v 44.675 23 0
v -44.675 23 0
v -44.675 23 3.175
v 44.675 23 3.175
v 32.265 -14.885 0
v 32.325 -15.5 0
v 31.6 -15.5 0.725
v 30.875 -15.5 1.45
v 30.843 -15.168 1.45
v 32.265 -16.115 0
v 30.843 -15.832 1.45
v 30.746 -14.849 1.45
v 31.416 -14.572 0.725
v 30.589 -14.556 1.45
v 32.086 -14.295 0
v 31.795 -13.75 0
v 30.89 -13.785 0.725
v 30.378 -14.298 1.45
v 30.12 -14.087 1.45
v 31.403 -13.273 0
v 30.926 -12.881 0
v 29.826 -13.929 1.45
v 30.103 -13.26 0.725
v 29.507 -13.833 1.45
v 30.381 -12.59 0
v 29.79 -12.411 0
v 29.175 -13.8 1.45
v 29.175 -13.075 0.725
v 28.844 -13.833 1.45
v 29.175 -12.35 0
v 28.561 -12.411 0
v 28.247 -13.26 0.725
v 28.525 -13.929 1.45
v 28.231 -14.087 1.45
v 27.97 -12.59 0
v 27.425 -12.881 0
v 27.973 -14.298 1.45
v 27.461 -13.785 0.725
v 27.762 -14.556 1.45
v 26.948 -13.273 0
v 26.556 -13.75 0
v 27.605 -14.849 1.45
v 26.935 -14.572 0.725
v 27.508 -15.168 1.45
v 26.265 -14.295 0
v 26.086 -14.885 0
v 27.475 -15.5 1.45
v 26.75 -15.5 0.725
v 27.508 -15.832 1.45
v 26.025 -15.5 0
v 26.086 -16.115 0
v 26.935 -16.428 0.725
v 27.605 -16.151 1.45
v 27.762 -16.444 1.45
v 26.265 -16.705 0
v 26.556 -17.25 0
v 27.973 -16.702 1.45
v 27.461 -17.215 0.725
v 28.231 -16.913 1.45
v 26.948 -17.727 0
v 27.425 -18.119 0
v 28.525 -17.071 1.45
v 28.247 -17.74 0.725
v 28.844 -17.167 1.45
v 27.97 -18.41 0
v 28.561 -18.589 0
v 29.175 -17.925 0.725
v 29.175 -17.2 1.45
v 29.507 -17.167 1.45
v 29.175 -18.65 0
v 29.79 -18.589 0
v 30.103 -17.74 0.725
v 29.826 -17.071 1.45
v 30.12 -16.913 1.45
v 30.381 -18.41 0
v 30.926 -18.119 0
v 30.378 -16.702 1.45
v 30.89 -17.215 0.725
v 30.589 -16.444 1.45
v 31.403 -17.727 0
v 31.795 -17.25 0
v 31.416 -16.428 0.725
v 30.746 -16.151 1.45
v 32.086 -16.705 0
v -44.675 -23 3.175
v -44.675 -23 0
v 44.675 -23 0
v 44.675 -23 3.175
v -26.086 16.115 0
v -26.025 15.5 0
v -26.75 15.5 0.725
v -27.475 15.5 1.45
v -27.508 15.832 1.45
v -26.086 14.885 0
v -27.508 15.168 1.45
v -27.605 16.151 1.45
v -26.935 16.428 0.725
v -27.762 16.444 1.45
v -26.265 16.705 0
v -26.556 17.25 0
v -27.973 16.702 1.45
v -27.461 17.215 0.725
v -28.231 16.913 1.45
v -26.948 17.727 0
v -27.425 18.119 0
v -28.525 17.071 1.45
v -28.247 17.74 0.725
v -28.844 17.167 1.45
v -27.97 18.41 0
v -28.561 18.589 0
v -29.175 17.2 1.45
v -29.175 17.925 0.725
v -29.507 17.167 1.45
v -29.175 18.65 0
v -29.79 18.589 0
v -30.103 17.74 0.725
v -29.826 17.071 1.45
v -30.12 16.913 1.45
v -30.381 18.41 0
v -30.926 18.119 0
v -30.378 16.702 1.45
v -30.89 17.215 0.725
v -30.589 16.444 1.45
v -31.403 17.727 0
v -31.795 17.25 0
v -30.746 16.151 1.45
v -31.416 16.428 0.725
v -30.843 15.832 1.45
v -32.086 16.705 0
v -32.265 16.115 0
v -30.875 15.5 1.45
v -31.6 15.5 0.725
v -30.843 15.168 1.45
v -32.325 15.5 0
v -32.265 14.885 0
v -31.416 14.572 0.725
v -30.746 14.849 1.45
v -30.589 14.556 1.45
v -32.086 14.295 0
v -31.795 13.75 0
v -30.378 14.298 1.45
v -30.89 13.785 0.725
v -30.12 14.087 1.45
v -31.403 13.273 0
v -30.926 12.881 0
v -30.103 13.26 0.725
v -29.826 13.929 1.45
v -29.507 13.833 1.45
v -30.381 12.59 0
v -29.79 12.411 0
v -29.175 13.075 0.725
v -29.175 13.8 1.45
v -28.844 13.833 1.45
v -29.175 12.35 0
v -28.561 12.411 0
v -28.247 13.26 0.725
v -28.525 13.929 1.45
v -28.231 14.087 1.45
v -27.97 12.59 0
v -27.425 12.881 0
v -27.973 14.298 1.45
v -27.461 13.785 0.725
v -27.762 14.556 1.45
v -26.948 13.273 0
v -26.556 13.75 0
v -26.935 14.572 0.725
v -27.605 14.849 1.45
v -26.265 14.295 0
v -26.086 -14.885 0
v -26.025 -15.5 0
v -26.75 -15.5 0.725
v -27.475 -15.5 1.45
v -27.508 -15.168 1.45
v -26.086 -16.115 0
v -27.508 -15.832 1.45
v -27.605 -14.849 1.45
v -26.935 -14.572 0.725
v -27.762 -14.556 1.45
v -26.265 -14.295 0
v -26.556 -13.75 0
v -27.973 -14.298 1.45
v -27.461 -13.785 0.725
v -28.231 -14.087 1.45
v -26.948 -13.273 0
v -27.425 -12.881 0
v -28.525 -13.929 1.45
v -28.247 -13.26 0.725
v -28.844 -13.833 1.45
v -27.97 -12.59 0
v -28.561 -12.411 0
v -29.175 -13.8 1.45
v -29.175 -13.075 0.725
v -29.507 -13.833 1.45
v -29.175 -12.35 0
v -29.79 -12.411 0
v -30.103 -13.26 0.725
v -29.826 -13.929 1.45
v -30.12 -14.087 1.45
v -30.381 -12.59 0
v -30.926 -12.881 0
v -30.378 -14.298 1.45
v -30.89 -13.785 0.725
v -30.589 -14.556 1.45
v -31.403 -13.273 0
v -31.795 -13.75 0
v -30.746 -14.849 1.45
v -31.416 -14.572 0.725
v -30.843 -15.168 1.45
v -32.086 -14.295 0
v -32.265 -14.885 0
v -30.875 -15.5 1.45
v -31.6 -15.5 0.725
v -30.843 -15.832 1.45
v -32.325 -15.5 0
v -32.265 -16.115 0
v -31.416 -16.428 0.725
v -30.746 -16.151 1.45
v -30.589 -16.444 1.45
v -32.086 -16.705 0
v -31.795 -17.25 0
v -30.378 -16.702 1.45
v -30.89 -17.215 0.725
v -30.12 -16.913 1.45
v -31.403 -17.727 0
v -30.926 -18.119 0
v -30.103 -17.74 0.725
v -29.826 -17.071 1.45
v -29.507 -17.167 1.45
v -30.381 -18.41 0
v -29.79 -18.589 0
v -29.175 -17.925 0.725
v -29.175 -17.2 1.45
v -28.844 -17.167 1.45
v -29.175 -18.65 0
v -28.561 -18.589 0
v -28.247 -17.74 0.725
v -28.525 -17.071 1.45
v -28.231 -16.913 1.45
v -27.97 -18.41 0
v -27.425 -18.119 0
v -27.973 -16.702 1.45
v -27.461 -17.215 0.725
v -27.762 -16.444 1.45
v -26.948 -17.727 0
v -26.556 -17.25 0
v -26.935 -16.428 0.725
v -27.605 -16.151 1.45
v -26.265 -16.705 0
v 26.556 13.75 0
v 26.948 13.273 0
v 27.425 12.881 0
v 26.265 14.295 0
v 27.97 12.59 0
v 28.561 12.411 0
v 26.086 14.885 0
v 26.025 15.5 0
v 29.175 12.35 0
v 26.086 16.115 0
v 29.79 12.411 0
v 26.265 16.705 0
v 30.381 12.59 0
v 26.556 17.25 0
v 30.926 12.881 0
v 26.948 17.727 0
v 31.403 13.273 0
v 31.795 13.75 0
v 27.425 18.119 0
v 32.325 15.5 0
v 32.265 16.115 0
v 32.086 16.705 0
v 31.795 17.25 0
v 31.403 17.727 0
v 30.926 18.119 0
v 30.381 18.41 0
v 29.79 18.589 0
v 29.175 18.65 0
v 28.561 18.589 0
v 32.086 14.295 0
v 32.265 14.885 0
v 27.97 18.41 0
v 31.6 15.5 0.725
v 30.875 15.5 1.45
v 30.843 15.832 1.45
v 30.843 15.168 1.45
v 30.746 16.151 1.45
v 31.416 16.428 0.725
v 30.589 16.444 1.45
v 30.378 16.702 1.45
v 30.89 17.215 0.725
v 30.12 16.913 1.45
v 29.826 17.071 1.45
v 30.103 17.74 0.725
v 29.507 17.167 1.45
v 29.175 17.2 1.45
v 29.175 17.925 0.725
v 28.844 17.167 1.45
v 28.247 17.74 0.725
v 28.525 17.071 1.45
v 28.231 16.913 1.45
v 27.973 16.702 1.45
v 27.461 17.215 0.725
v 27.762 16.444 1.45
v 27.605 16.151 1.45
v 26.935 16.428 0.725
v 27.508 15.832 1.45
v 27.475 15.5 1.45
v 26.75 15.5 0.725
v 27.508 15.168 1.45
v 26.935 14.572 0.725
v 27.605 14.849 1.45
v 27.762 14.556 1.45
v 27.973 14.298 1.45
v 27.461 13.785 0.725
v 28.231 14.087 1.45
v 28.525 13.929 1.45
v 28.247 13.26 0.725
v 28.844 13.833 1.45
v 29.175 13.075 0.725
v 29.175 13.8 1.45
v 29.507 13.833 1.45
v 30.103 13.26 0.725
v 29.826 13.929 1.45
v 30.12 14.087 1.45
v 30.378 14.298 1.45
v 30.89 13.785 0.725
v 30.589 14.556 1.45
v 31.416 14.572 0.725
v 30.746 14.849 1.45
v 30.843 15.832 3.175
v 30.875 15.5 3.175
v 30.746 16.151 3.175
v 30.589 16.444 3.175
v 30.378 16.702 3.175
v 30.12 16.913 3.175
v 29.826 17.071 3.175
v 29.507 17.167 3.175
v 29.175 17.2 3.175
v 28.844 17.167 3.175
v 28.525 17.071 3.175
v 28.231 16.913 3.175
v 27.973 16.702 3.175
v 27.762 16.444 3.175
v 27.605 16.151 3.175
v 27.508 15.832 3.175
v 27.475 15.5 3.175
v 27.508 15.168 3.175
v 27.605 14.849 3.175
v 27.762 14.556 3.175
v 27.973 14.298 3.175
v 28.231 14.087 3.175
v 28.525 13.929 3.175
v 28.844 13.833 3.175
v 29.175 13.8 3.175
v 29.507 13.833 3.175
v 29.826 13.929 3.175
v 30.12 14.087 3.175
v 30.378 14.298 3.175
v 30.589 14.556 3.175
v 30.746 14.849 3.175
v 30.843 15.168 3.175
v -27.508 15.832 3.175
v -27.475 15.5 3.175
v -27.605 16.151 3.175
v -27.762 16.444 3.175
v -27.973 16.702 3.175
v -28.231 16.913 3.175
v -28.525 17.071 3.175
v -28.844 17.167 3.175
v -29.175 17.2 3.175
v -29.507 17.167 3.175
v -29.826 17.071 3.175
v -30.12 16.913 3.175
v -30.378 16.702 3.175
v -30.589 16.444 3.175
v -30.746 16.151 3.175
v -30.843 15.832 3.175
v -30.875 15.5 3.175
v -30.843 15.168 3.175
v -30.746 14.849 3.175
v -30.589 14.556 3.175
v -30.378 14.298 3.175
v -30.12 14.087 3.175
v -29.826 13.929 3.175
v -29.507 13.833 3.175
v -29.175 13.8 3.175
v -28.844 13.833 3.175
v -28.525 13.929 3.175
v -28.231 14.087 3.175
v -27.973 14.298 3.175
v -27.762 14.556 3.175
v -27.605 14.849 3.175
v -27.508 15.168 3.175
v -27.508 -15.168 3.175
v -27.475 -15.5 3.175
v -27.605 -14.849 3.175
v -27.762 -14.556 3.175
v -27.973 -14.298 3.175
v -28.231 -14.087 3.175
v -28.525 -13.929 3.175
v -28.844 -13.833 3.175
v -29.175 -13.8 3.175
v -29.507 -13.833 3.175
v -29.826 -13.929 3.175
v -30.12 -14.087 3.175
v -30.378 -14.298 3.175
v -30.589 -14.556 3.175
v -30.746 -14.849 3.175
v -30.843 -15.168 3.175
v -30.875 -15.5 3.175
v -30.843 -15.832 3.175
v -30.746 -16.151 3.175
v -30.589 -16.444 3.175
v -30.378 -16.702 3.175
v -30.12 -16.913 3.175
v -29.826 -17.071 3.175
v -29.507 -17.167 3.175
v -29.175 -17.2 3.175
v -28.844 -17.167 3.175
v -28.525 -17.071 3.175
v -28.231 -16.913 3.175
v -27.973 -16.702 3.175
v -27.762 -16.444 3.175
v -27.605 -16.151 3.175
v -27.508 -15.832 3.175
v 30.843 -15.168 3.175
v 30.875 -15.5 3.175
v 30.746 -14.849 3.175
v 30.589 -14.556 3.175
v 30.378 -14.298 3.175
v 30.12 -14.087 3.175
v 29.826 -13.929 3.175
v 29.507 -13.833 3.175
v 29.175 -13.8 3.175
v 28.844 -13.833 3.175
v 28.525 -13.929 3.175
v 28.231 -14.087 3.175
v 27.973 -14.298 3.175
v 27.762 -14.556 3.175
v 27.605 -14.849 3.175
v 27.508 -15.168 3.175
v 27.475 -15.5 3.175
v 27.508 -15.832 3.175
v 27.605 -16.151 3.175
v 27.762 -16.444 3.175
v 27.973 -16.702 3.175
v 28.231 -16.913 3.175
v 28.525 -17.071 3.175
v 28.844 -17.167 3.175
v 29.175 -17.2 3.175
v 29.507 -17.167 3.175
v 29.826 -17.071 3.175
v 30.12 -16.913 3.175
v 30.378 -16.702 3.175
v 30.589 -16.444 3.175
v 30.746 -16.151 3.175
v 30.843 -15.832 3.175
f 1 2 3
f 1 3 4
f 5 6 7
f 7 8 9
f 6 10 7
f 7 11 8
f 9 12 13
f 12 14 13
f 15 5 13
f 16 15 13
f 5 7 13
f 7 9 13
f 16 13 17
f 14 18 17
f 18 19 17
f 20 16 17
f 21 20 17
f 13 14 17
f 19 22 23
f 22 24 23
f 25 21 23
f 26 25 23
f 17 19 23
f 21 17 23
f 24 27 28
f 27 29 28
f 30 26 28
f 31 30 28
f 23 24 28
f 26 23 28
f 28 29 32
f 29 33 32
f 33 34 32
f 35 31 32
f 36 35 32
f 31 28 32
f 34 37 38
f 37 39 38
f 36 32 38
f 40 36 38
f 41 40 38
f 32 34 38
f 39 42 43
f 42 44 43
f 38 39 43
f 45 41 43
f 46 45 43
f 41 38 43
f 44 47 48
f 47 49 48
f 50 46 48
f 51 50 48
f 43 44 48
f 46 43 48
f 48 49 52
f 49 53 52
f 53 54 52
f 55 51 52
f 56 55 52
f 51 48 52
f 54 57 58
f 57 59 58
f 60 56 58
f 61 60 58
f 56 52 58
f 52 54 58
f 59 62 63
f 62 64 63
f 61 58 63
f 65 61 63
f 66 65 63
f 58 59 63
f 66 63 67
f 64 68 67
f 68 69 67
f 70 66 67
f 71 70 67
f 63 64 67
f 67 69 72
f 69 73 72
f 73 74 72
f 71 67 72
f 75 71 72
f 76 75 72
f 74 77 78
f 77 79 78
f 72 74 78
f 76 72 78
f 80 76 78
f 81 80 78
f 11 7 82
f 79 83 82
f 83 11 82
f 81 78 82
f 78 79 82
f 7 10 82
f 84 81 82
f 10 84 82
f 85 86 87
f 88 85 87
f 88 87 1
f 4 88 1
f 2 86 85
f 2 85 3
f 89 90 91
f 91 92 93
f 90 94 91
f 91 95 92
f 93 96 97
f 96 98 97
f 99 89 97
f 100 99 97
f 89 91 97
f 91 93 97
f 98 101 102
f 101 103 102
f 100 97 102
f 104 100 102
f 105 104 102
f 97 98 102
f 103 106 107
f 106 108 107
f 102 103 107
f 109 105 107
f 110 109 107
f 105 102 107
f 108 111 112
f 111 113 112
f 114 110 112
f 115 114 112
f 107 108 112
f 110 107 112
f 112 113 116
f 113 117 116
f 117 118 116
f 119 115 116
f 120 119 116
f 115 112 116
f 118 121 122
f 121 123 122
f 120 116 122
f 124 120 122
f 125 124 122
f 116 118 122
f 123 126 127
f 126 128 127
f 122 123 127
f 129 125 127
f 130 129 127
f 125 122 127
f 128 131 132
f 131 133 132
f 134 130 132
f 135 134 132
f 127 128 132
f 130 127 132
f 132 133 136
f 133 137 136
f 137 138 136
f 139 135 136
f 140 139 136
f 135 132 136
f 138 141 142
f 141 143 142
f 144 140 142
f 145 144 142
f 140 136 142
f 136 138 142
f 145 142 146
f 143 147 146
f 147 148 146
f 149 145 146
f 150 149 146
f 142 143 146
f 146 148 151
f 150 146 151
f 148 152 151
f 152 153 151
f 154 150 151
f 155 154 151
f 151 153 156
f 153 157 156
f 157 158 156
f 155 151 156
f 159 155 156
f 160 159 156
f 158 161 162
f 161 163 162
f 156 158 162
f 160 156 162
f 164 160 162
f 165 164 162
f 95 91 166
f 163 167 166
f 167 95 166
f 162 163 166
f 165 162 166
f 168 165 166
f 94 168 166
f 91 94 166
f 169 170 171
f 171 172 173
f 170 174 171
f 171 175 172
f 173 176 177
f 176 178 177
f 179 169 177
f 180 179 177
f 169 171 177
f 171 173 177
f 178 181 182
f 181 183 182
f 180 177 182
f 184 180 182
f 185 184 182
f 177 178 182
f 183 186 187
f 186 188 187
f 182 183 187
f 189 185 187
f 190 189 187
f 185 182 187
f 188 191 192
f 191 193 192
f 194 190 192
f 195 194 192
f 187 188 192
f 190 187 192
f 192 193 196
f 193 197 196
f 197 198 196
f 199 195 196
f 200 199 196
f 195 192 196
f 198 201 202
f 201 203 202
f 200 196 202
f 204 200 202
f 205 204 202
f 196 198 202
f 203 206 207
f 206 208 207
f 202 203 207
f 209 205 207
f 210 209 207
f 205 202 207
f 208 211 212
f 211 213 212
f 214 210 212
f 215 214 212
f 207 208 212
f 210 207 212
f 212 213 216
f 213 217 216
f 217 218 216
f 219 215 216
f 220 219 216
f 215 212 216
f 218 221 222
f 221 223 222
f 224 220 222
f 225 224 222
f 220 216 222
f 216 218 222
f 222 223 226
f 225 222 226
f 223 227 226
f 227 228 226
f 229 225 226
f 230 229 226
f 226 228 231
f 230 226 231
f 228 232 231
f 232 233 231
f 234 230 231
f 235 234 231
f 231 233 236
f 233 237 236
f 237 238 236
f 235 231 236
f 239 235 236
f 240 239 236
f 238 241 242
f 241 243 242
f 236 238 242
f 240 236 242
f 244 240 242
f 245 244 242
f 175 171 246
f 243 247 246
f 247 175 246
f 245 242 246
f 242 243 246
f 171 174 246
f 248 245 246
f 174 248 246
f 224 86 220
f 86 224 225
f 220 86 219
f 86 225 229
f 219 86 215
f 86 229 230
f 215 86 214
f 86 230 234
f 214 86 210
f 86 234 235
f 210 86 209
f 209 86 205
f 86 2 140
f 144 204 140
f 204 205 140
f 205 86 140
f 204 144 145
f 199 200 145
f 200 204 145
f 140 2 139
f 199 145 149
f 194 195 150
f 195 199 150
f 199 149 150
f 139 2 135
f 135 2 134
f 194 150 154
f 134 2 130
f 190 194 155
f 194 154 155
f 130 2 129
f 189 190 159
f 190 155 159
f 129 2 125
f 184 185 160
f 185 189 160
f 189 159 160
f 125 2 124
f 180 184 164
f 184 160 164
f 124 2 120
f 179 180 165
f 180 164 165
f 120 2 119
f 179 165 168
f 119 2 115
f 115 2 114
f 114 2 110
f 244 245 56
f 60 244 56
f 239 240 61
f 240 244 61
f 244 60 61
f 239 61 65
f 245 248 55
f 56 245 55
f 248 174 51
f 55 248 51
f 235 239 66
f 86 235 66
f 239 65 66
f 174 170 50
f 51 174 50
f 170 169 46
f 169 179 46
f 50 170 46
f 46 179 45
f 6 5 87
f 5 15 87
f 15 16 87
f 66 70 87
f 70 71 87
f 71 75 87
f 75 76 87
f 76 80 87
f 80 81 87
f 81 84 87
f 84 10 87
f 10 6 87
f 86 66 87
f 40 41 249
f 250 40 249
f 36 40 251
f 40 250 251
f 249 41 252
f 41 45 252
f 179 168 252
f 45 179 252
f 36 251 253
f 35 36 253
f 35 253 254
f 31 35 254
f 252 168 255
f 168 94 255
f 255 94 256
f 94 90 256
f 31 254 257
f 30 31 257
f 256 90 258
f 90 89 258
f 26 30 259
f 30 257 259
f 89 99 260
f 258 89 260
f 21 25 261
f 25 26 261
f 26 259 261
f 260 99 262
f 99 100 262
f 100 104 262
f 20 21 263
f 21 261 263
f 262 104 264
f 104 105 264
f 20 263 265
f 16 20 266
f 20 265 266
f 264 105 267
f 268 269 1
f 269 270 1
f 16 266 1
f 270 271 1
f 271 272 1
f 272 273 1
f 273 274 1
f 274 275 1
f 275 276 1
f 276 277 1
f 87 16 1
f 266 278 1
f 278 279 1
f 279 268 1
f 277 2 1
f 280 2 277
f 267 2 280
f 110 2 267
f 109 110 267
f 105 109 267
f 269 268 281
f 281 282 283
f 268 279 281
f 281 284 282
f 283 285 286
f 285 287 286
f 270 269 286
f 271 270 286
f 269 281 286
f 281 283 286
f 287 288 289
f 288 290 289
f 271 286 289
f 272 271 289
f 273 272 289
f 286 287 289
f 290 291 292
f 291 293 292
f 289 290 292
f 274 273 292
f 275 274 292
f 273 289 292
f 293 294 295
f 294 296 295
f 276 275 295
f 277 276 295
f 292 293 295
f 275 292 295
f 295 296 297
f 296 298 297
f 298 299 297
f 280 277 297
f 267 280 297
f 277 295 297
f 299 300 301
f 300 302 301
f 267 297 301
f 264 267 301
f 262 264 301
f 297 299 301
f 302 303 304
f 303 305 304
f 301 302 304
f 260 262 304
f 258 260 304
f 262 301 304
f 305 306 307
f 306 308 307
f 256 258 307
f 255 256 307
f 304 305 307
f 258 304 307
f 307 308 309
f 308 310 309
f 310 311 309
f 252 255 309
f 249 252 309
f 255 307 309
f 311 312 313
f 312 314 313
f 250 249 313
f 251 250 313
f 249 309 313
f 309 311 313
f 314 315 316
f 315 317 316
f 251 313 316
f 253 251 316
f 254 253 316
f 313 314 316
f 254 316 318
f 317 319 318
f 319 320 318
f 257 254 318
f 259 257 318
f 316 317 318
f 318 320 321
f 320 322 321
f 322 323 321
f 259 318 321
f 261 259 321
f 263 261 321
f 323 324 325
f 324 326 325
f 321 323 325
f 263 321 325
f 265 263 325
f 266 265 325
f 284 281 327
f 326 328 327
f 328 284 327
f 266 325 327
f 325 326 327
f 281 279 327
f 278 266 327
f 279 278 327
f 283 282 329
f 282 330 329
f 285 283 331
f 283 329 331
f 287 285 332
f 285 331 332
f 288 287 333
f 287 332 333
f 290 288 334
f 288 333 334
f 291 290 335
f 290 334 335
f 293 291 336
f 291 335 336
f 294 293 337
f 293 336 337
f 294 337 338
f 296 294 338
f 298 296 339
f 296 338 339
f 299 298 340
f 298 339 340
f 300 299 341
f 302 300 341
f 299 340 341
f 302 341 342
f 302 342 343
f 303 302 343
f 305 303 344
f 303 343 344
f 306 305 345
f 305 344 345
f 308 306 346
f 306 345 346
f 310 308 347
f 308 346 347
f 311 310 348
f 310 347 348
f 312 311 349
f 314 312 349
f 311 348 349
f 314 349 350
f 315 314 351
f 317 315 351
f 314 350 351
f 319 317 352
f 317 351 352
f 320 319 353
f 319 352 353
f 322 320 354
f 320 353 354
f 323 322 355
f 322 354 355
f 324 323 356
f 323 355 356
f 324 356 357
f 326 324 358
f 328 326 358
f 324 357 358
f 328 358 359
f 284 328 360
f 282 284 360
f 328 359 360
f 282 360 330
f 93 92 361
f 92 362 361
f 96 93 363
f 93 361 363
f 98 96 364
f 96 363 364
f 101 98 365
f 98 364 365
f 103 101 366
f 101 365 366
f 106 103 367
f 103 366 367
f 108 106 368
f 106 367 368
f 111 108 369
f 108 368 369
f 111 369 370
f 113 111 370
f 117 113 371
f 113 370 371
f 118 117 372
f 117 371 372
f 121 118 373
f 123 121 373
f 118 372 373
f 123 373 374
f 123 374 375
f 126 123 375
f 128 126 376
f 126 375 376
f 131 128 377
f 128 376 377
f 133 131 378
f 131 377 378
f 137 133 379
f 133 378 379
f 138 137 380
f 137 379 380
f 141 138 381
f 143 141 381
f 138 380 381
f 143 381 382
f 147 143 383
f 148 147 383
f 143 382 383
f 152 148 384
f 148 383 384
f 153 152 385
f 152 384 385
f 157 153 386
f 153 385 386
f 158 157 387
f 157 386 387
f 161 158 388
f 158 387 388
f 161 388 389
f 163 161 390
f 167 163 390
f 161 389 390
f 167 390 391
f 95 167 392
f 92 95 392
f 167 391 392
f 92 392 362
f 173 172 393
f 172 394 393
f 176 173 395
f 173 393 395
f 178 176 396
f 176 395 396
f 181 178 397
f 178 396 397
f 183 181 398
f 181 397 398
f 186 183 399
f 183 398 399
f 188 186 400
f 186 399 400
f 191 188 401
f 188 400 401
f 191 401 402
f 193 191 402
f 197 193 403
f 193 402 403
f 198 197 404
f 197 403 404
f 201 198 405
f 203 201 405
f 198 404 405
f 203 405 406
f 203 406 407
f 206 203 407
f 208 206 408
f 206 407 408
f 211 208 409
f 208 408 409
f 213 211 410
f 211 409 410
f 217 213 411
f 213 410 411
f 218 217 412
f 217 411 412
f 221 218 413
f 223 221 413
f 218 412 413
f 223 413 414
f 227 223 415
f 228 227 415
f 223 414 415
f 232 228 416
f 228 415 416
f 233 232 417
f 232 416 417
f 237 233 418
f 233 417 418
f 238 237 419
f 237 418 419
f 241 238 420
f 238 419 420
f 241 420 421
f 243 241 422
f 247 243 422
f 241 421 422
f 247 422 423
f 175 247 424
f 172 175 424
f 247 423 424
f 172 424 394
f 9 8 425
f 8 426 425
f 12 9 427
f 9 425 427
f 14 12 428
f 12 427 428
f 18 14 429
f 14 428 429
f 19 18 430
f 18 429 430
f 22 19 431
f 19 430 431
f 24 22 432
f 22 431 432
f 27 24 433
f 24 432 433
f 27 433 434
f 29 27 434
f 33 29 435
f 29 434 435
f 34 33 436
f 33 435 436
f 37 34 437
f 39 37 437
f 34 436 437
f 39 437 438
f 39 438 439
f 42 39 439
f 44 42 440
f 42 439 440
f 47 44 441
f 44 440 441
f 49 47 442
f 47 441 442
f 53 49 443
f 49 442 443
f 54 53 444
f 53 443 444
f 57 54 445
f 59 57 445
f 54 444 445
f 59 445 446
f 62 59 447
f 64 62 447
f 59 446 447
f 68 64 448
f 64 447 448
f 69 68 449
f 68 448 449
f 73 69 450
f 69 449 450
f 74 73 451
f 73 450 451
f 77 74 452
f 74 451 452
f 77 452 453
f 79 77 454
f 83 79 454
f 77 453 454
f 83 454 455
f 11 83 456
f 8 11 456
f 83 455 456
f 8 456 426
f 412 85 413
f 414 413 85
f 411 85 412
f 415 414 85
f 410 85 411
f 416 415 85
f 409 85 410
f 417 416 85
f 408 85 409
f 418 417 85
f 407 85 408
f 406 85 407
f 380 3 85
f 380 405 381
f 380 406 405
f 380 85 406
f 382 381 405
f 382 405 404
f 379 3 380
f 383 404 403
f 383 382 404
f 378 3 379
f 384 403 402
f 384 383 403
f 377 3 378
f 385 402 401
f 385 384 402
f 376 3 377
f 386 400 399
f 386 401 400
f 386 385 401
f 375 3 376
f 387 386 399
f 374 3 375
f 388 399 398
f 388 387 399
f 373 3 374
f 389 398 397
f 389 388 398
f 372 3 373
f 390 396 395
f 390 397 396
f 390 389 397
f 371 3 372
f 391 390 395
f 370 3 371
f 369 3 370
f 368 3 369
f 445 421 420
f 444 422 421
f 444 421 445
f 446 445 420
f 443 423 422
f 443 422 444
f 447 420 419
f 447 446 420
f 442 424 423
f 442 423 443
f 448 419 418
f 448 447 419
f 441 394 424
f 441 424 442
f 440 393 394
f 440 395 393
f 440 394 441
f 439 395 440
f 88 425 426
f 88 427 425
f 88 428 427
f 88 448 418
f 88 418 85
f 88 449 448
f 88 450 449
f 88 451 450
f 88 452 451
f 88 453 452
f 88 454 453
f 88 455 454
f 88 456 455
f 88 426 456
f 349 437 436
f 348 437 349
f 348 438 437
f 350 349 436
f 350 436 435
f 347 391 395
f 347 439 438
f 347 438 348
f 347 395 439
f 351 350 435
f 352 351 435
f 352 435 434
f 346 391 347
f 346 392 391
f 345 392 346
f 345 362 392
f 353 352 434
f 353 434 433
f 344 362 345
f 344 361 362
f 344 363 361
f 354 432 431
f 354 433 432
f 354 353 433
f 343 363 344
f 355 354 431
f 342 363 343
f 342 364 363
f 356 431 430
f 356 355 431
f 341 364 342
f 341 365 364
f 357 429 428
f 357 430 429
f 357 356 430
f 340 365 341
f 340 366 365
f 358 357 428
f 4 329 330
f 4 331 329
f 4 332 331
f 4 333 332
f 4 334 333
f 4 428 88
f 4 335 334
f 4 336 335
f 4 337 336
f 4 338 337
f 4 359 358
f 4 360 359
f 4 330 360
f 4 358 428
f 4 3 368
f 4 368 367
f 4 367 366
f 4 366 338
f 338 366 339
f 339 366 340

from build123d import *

# Parameters (mm, degrees)
PROFILE_SKETCH_W                                = 89.349072
PROFILE_SKETCH_H                                = 46
PROFILE_EXTRUDE_DEPTH                           = 3.175
CSK_FOR_M3_FLAT_HEAD_MACHINE_SCREW1_D           = 3.4
CSK_FOR_M3_FLAT_HEAD_MACHINE_SCREW1_CSINK_D     = 6.3
CSK_FOR_M3_FLAT_HEAD_MACHINE_SCREW1_CSINK_ANGLE = 90


with BuildPart() as part:
    # Profile Sketch → Profile Extrude (new body)
    with BuildSketch(Plane.XY):
        Rectangle(PROFILE_SKETCH_W, PROFILE_SKETCH_H)
    extrude(amount=PROFILE_EXTRUDE_DEPTH)

    # CSK for M3 Flat Head Machine Screw1 (through all)
    with Locations(Plane(origin=(-29.175456, 15.500000014, 0), x_dir=(-1, 0, 0), z_dir=(0, 0, -1))):
        with Locations((0, 0), (0, -31.000000028), (-58.350912, -31.000000028), (-58.350912, 0)):
            CounterSinkHole(CSK_FOR_M3_FLAT_HEAD_MACHINE_SCREW1_D / 2, CSK_FOR_M3_FLAT_HEAD_MACHINE_SCREW1_CSINK_D / 2, counter_sink_angle=CSK_FOR_M3_FLAT_HEAD_MACHINE_SCREW1_CSINK_ANGLE)


solid = part.part
